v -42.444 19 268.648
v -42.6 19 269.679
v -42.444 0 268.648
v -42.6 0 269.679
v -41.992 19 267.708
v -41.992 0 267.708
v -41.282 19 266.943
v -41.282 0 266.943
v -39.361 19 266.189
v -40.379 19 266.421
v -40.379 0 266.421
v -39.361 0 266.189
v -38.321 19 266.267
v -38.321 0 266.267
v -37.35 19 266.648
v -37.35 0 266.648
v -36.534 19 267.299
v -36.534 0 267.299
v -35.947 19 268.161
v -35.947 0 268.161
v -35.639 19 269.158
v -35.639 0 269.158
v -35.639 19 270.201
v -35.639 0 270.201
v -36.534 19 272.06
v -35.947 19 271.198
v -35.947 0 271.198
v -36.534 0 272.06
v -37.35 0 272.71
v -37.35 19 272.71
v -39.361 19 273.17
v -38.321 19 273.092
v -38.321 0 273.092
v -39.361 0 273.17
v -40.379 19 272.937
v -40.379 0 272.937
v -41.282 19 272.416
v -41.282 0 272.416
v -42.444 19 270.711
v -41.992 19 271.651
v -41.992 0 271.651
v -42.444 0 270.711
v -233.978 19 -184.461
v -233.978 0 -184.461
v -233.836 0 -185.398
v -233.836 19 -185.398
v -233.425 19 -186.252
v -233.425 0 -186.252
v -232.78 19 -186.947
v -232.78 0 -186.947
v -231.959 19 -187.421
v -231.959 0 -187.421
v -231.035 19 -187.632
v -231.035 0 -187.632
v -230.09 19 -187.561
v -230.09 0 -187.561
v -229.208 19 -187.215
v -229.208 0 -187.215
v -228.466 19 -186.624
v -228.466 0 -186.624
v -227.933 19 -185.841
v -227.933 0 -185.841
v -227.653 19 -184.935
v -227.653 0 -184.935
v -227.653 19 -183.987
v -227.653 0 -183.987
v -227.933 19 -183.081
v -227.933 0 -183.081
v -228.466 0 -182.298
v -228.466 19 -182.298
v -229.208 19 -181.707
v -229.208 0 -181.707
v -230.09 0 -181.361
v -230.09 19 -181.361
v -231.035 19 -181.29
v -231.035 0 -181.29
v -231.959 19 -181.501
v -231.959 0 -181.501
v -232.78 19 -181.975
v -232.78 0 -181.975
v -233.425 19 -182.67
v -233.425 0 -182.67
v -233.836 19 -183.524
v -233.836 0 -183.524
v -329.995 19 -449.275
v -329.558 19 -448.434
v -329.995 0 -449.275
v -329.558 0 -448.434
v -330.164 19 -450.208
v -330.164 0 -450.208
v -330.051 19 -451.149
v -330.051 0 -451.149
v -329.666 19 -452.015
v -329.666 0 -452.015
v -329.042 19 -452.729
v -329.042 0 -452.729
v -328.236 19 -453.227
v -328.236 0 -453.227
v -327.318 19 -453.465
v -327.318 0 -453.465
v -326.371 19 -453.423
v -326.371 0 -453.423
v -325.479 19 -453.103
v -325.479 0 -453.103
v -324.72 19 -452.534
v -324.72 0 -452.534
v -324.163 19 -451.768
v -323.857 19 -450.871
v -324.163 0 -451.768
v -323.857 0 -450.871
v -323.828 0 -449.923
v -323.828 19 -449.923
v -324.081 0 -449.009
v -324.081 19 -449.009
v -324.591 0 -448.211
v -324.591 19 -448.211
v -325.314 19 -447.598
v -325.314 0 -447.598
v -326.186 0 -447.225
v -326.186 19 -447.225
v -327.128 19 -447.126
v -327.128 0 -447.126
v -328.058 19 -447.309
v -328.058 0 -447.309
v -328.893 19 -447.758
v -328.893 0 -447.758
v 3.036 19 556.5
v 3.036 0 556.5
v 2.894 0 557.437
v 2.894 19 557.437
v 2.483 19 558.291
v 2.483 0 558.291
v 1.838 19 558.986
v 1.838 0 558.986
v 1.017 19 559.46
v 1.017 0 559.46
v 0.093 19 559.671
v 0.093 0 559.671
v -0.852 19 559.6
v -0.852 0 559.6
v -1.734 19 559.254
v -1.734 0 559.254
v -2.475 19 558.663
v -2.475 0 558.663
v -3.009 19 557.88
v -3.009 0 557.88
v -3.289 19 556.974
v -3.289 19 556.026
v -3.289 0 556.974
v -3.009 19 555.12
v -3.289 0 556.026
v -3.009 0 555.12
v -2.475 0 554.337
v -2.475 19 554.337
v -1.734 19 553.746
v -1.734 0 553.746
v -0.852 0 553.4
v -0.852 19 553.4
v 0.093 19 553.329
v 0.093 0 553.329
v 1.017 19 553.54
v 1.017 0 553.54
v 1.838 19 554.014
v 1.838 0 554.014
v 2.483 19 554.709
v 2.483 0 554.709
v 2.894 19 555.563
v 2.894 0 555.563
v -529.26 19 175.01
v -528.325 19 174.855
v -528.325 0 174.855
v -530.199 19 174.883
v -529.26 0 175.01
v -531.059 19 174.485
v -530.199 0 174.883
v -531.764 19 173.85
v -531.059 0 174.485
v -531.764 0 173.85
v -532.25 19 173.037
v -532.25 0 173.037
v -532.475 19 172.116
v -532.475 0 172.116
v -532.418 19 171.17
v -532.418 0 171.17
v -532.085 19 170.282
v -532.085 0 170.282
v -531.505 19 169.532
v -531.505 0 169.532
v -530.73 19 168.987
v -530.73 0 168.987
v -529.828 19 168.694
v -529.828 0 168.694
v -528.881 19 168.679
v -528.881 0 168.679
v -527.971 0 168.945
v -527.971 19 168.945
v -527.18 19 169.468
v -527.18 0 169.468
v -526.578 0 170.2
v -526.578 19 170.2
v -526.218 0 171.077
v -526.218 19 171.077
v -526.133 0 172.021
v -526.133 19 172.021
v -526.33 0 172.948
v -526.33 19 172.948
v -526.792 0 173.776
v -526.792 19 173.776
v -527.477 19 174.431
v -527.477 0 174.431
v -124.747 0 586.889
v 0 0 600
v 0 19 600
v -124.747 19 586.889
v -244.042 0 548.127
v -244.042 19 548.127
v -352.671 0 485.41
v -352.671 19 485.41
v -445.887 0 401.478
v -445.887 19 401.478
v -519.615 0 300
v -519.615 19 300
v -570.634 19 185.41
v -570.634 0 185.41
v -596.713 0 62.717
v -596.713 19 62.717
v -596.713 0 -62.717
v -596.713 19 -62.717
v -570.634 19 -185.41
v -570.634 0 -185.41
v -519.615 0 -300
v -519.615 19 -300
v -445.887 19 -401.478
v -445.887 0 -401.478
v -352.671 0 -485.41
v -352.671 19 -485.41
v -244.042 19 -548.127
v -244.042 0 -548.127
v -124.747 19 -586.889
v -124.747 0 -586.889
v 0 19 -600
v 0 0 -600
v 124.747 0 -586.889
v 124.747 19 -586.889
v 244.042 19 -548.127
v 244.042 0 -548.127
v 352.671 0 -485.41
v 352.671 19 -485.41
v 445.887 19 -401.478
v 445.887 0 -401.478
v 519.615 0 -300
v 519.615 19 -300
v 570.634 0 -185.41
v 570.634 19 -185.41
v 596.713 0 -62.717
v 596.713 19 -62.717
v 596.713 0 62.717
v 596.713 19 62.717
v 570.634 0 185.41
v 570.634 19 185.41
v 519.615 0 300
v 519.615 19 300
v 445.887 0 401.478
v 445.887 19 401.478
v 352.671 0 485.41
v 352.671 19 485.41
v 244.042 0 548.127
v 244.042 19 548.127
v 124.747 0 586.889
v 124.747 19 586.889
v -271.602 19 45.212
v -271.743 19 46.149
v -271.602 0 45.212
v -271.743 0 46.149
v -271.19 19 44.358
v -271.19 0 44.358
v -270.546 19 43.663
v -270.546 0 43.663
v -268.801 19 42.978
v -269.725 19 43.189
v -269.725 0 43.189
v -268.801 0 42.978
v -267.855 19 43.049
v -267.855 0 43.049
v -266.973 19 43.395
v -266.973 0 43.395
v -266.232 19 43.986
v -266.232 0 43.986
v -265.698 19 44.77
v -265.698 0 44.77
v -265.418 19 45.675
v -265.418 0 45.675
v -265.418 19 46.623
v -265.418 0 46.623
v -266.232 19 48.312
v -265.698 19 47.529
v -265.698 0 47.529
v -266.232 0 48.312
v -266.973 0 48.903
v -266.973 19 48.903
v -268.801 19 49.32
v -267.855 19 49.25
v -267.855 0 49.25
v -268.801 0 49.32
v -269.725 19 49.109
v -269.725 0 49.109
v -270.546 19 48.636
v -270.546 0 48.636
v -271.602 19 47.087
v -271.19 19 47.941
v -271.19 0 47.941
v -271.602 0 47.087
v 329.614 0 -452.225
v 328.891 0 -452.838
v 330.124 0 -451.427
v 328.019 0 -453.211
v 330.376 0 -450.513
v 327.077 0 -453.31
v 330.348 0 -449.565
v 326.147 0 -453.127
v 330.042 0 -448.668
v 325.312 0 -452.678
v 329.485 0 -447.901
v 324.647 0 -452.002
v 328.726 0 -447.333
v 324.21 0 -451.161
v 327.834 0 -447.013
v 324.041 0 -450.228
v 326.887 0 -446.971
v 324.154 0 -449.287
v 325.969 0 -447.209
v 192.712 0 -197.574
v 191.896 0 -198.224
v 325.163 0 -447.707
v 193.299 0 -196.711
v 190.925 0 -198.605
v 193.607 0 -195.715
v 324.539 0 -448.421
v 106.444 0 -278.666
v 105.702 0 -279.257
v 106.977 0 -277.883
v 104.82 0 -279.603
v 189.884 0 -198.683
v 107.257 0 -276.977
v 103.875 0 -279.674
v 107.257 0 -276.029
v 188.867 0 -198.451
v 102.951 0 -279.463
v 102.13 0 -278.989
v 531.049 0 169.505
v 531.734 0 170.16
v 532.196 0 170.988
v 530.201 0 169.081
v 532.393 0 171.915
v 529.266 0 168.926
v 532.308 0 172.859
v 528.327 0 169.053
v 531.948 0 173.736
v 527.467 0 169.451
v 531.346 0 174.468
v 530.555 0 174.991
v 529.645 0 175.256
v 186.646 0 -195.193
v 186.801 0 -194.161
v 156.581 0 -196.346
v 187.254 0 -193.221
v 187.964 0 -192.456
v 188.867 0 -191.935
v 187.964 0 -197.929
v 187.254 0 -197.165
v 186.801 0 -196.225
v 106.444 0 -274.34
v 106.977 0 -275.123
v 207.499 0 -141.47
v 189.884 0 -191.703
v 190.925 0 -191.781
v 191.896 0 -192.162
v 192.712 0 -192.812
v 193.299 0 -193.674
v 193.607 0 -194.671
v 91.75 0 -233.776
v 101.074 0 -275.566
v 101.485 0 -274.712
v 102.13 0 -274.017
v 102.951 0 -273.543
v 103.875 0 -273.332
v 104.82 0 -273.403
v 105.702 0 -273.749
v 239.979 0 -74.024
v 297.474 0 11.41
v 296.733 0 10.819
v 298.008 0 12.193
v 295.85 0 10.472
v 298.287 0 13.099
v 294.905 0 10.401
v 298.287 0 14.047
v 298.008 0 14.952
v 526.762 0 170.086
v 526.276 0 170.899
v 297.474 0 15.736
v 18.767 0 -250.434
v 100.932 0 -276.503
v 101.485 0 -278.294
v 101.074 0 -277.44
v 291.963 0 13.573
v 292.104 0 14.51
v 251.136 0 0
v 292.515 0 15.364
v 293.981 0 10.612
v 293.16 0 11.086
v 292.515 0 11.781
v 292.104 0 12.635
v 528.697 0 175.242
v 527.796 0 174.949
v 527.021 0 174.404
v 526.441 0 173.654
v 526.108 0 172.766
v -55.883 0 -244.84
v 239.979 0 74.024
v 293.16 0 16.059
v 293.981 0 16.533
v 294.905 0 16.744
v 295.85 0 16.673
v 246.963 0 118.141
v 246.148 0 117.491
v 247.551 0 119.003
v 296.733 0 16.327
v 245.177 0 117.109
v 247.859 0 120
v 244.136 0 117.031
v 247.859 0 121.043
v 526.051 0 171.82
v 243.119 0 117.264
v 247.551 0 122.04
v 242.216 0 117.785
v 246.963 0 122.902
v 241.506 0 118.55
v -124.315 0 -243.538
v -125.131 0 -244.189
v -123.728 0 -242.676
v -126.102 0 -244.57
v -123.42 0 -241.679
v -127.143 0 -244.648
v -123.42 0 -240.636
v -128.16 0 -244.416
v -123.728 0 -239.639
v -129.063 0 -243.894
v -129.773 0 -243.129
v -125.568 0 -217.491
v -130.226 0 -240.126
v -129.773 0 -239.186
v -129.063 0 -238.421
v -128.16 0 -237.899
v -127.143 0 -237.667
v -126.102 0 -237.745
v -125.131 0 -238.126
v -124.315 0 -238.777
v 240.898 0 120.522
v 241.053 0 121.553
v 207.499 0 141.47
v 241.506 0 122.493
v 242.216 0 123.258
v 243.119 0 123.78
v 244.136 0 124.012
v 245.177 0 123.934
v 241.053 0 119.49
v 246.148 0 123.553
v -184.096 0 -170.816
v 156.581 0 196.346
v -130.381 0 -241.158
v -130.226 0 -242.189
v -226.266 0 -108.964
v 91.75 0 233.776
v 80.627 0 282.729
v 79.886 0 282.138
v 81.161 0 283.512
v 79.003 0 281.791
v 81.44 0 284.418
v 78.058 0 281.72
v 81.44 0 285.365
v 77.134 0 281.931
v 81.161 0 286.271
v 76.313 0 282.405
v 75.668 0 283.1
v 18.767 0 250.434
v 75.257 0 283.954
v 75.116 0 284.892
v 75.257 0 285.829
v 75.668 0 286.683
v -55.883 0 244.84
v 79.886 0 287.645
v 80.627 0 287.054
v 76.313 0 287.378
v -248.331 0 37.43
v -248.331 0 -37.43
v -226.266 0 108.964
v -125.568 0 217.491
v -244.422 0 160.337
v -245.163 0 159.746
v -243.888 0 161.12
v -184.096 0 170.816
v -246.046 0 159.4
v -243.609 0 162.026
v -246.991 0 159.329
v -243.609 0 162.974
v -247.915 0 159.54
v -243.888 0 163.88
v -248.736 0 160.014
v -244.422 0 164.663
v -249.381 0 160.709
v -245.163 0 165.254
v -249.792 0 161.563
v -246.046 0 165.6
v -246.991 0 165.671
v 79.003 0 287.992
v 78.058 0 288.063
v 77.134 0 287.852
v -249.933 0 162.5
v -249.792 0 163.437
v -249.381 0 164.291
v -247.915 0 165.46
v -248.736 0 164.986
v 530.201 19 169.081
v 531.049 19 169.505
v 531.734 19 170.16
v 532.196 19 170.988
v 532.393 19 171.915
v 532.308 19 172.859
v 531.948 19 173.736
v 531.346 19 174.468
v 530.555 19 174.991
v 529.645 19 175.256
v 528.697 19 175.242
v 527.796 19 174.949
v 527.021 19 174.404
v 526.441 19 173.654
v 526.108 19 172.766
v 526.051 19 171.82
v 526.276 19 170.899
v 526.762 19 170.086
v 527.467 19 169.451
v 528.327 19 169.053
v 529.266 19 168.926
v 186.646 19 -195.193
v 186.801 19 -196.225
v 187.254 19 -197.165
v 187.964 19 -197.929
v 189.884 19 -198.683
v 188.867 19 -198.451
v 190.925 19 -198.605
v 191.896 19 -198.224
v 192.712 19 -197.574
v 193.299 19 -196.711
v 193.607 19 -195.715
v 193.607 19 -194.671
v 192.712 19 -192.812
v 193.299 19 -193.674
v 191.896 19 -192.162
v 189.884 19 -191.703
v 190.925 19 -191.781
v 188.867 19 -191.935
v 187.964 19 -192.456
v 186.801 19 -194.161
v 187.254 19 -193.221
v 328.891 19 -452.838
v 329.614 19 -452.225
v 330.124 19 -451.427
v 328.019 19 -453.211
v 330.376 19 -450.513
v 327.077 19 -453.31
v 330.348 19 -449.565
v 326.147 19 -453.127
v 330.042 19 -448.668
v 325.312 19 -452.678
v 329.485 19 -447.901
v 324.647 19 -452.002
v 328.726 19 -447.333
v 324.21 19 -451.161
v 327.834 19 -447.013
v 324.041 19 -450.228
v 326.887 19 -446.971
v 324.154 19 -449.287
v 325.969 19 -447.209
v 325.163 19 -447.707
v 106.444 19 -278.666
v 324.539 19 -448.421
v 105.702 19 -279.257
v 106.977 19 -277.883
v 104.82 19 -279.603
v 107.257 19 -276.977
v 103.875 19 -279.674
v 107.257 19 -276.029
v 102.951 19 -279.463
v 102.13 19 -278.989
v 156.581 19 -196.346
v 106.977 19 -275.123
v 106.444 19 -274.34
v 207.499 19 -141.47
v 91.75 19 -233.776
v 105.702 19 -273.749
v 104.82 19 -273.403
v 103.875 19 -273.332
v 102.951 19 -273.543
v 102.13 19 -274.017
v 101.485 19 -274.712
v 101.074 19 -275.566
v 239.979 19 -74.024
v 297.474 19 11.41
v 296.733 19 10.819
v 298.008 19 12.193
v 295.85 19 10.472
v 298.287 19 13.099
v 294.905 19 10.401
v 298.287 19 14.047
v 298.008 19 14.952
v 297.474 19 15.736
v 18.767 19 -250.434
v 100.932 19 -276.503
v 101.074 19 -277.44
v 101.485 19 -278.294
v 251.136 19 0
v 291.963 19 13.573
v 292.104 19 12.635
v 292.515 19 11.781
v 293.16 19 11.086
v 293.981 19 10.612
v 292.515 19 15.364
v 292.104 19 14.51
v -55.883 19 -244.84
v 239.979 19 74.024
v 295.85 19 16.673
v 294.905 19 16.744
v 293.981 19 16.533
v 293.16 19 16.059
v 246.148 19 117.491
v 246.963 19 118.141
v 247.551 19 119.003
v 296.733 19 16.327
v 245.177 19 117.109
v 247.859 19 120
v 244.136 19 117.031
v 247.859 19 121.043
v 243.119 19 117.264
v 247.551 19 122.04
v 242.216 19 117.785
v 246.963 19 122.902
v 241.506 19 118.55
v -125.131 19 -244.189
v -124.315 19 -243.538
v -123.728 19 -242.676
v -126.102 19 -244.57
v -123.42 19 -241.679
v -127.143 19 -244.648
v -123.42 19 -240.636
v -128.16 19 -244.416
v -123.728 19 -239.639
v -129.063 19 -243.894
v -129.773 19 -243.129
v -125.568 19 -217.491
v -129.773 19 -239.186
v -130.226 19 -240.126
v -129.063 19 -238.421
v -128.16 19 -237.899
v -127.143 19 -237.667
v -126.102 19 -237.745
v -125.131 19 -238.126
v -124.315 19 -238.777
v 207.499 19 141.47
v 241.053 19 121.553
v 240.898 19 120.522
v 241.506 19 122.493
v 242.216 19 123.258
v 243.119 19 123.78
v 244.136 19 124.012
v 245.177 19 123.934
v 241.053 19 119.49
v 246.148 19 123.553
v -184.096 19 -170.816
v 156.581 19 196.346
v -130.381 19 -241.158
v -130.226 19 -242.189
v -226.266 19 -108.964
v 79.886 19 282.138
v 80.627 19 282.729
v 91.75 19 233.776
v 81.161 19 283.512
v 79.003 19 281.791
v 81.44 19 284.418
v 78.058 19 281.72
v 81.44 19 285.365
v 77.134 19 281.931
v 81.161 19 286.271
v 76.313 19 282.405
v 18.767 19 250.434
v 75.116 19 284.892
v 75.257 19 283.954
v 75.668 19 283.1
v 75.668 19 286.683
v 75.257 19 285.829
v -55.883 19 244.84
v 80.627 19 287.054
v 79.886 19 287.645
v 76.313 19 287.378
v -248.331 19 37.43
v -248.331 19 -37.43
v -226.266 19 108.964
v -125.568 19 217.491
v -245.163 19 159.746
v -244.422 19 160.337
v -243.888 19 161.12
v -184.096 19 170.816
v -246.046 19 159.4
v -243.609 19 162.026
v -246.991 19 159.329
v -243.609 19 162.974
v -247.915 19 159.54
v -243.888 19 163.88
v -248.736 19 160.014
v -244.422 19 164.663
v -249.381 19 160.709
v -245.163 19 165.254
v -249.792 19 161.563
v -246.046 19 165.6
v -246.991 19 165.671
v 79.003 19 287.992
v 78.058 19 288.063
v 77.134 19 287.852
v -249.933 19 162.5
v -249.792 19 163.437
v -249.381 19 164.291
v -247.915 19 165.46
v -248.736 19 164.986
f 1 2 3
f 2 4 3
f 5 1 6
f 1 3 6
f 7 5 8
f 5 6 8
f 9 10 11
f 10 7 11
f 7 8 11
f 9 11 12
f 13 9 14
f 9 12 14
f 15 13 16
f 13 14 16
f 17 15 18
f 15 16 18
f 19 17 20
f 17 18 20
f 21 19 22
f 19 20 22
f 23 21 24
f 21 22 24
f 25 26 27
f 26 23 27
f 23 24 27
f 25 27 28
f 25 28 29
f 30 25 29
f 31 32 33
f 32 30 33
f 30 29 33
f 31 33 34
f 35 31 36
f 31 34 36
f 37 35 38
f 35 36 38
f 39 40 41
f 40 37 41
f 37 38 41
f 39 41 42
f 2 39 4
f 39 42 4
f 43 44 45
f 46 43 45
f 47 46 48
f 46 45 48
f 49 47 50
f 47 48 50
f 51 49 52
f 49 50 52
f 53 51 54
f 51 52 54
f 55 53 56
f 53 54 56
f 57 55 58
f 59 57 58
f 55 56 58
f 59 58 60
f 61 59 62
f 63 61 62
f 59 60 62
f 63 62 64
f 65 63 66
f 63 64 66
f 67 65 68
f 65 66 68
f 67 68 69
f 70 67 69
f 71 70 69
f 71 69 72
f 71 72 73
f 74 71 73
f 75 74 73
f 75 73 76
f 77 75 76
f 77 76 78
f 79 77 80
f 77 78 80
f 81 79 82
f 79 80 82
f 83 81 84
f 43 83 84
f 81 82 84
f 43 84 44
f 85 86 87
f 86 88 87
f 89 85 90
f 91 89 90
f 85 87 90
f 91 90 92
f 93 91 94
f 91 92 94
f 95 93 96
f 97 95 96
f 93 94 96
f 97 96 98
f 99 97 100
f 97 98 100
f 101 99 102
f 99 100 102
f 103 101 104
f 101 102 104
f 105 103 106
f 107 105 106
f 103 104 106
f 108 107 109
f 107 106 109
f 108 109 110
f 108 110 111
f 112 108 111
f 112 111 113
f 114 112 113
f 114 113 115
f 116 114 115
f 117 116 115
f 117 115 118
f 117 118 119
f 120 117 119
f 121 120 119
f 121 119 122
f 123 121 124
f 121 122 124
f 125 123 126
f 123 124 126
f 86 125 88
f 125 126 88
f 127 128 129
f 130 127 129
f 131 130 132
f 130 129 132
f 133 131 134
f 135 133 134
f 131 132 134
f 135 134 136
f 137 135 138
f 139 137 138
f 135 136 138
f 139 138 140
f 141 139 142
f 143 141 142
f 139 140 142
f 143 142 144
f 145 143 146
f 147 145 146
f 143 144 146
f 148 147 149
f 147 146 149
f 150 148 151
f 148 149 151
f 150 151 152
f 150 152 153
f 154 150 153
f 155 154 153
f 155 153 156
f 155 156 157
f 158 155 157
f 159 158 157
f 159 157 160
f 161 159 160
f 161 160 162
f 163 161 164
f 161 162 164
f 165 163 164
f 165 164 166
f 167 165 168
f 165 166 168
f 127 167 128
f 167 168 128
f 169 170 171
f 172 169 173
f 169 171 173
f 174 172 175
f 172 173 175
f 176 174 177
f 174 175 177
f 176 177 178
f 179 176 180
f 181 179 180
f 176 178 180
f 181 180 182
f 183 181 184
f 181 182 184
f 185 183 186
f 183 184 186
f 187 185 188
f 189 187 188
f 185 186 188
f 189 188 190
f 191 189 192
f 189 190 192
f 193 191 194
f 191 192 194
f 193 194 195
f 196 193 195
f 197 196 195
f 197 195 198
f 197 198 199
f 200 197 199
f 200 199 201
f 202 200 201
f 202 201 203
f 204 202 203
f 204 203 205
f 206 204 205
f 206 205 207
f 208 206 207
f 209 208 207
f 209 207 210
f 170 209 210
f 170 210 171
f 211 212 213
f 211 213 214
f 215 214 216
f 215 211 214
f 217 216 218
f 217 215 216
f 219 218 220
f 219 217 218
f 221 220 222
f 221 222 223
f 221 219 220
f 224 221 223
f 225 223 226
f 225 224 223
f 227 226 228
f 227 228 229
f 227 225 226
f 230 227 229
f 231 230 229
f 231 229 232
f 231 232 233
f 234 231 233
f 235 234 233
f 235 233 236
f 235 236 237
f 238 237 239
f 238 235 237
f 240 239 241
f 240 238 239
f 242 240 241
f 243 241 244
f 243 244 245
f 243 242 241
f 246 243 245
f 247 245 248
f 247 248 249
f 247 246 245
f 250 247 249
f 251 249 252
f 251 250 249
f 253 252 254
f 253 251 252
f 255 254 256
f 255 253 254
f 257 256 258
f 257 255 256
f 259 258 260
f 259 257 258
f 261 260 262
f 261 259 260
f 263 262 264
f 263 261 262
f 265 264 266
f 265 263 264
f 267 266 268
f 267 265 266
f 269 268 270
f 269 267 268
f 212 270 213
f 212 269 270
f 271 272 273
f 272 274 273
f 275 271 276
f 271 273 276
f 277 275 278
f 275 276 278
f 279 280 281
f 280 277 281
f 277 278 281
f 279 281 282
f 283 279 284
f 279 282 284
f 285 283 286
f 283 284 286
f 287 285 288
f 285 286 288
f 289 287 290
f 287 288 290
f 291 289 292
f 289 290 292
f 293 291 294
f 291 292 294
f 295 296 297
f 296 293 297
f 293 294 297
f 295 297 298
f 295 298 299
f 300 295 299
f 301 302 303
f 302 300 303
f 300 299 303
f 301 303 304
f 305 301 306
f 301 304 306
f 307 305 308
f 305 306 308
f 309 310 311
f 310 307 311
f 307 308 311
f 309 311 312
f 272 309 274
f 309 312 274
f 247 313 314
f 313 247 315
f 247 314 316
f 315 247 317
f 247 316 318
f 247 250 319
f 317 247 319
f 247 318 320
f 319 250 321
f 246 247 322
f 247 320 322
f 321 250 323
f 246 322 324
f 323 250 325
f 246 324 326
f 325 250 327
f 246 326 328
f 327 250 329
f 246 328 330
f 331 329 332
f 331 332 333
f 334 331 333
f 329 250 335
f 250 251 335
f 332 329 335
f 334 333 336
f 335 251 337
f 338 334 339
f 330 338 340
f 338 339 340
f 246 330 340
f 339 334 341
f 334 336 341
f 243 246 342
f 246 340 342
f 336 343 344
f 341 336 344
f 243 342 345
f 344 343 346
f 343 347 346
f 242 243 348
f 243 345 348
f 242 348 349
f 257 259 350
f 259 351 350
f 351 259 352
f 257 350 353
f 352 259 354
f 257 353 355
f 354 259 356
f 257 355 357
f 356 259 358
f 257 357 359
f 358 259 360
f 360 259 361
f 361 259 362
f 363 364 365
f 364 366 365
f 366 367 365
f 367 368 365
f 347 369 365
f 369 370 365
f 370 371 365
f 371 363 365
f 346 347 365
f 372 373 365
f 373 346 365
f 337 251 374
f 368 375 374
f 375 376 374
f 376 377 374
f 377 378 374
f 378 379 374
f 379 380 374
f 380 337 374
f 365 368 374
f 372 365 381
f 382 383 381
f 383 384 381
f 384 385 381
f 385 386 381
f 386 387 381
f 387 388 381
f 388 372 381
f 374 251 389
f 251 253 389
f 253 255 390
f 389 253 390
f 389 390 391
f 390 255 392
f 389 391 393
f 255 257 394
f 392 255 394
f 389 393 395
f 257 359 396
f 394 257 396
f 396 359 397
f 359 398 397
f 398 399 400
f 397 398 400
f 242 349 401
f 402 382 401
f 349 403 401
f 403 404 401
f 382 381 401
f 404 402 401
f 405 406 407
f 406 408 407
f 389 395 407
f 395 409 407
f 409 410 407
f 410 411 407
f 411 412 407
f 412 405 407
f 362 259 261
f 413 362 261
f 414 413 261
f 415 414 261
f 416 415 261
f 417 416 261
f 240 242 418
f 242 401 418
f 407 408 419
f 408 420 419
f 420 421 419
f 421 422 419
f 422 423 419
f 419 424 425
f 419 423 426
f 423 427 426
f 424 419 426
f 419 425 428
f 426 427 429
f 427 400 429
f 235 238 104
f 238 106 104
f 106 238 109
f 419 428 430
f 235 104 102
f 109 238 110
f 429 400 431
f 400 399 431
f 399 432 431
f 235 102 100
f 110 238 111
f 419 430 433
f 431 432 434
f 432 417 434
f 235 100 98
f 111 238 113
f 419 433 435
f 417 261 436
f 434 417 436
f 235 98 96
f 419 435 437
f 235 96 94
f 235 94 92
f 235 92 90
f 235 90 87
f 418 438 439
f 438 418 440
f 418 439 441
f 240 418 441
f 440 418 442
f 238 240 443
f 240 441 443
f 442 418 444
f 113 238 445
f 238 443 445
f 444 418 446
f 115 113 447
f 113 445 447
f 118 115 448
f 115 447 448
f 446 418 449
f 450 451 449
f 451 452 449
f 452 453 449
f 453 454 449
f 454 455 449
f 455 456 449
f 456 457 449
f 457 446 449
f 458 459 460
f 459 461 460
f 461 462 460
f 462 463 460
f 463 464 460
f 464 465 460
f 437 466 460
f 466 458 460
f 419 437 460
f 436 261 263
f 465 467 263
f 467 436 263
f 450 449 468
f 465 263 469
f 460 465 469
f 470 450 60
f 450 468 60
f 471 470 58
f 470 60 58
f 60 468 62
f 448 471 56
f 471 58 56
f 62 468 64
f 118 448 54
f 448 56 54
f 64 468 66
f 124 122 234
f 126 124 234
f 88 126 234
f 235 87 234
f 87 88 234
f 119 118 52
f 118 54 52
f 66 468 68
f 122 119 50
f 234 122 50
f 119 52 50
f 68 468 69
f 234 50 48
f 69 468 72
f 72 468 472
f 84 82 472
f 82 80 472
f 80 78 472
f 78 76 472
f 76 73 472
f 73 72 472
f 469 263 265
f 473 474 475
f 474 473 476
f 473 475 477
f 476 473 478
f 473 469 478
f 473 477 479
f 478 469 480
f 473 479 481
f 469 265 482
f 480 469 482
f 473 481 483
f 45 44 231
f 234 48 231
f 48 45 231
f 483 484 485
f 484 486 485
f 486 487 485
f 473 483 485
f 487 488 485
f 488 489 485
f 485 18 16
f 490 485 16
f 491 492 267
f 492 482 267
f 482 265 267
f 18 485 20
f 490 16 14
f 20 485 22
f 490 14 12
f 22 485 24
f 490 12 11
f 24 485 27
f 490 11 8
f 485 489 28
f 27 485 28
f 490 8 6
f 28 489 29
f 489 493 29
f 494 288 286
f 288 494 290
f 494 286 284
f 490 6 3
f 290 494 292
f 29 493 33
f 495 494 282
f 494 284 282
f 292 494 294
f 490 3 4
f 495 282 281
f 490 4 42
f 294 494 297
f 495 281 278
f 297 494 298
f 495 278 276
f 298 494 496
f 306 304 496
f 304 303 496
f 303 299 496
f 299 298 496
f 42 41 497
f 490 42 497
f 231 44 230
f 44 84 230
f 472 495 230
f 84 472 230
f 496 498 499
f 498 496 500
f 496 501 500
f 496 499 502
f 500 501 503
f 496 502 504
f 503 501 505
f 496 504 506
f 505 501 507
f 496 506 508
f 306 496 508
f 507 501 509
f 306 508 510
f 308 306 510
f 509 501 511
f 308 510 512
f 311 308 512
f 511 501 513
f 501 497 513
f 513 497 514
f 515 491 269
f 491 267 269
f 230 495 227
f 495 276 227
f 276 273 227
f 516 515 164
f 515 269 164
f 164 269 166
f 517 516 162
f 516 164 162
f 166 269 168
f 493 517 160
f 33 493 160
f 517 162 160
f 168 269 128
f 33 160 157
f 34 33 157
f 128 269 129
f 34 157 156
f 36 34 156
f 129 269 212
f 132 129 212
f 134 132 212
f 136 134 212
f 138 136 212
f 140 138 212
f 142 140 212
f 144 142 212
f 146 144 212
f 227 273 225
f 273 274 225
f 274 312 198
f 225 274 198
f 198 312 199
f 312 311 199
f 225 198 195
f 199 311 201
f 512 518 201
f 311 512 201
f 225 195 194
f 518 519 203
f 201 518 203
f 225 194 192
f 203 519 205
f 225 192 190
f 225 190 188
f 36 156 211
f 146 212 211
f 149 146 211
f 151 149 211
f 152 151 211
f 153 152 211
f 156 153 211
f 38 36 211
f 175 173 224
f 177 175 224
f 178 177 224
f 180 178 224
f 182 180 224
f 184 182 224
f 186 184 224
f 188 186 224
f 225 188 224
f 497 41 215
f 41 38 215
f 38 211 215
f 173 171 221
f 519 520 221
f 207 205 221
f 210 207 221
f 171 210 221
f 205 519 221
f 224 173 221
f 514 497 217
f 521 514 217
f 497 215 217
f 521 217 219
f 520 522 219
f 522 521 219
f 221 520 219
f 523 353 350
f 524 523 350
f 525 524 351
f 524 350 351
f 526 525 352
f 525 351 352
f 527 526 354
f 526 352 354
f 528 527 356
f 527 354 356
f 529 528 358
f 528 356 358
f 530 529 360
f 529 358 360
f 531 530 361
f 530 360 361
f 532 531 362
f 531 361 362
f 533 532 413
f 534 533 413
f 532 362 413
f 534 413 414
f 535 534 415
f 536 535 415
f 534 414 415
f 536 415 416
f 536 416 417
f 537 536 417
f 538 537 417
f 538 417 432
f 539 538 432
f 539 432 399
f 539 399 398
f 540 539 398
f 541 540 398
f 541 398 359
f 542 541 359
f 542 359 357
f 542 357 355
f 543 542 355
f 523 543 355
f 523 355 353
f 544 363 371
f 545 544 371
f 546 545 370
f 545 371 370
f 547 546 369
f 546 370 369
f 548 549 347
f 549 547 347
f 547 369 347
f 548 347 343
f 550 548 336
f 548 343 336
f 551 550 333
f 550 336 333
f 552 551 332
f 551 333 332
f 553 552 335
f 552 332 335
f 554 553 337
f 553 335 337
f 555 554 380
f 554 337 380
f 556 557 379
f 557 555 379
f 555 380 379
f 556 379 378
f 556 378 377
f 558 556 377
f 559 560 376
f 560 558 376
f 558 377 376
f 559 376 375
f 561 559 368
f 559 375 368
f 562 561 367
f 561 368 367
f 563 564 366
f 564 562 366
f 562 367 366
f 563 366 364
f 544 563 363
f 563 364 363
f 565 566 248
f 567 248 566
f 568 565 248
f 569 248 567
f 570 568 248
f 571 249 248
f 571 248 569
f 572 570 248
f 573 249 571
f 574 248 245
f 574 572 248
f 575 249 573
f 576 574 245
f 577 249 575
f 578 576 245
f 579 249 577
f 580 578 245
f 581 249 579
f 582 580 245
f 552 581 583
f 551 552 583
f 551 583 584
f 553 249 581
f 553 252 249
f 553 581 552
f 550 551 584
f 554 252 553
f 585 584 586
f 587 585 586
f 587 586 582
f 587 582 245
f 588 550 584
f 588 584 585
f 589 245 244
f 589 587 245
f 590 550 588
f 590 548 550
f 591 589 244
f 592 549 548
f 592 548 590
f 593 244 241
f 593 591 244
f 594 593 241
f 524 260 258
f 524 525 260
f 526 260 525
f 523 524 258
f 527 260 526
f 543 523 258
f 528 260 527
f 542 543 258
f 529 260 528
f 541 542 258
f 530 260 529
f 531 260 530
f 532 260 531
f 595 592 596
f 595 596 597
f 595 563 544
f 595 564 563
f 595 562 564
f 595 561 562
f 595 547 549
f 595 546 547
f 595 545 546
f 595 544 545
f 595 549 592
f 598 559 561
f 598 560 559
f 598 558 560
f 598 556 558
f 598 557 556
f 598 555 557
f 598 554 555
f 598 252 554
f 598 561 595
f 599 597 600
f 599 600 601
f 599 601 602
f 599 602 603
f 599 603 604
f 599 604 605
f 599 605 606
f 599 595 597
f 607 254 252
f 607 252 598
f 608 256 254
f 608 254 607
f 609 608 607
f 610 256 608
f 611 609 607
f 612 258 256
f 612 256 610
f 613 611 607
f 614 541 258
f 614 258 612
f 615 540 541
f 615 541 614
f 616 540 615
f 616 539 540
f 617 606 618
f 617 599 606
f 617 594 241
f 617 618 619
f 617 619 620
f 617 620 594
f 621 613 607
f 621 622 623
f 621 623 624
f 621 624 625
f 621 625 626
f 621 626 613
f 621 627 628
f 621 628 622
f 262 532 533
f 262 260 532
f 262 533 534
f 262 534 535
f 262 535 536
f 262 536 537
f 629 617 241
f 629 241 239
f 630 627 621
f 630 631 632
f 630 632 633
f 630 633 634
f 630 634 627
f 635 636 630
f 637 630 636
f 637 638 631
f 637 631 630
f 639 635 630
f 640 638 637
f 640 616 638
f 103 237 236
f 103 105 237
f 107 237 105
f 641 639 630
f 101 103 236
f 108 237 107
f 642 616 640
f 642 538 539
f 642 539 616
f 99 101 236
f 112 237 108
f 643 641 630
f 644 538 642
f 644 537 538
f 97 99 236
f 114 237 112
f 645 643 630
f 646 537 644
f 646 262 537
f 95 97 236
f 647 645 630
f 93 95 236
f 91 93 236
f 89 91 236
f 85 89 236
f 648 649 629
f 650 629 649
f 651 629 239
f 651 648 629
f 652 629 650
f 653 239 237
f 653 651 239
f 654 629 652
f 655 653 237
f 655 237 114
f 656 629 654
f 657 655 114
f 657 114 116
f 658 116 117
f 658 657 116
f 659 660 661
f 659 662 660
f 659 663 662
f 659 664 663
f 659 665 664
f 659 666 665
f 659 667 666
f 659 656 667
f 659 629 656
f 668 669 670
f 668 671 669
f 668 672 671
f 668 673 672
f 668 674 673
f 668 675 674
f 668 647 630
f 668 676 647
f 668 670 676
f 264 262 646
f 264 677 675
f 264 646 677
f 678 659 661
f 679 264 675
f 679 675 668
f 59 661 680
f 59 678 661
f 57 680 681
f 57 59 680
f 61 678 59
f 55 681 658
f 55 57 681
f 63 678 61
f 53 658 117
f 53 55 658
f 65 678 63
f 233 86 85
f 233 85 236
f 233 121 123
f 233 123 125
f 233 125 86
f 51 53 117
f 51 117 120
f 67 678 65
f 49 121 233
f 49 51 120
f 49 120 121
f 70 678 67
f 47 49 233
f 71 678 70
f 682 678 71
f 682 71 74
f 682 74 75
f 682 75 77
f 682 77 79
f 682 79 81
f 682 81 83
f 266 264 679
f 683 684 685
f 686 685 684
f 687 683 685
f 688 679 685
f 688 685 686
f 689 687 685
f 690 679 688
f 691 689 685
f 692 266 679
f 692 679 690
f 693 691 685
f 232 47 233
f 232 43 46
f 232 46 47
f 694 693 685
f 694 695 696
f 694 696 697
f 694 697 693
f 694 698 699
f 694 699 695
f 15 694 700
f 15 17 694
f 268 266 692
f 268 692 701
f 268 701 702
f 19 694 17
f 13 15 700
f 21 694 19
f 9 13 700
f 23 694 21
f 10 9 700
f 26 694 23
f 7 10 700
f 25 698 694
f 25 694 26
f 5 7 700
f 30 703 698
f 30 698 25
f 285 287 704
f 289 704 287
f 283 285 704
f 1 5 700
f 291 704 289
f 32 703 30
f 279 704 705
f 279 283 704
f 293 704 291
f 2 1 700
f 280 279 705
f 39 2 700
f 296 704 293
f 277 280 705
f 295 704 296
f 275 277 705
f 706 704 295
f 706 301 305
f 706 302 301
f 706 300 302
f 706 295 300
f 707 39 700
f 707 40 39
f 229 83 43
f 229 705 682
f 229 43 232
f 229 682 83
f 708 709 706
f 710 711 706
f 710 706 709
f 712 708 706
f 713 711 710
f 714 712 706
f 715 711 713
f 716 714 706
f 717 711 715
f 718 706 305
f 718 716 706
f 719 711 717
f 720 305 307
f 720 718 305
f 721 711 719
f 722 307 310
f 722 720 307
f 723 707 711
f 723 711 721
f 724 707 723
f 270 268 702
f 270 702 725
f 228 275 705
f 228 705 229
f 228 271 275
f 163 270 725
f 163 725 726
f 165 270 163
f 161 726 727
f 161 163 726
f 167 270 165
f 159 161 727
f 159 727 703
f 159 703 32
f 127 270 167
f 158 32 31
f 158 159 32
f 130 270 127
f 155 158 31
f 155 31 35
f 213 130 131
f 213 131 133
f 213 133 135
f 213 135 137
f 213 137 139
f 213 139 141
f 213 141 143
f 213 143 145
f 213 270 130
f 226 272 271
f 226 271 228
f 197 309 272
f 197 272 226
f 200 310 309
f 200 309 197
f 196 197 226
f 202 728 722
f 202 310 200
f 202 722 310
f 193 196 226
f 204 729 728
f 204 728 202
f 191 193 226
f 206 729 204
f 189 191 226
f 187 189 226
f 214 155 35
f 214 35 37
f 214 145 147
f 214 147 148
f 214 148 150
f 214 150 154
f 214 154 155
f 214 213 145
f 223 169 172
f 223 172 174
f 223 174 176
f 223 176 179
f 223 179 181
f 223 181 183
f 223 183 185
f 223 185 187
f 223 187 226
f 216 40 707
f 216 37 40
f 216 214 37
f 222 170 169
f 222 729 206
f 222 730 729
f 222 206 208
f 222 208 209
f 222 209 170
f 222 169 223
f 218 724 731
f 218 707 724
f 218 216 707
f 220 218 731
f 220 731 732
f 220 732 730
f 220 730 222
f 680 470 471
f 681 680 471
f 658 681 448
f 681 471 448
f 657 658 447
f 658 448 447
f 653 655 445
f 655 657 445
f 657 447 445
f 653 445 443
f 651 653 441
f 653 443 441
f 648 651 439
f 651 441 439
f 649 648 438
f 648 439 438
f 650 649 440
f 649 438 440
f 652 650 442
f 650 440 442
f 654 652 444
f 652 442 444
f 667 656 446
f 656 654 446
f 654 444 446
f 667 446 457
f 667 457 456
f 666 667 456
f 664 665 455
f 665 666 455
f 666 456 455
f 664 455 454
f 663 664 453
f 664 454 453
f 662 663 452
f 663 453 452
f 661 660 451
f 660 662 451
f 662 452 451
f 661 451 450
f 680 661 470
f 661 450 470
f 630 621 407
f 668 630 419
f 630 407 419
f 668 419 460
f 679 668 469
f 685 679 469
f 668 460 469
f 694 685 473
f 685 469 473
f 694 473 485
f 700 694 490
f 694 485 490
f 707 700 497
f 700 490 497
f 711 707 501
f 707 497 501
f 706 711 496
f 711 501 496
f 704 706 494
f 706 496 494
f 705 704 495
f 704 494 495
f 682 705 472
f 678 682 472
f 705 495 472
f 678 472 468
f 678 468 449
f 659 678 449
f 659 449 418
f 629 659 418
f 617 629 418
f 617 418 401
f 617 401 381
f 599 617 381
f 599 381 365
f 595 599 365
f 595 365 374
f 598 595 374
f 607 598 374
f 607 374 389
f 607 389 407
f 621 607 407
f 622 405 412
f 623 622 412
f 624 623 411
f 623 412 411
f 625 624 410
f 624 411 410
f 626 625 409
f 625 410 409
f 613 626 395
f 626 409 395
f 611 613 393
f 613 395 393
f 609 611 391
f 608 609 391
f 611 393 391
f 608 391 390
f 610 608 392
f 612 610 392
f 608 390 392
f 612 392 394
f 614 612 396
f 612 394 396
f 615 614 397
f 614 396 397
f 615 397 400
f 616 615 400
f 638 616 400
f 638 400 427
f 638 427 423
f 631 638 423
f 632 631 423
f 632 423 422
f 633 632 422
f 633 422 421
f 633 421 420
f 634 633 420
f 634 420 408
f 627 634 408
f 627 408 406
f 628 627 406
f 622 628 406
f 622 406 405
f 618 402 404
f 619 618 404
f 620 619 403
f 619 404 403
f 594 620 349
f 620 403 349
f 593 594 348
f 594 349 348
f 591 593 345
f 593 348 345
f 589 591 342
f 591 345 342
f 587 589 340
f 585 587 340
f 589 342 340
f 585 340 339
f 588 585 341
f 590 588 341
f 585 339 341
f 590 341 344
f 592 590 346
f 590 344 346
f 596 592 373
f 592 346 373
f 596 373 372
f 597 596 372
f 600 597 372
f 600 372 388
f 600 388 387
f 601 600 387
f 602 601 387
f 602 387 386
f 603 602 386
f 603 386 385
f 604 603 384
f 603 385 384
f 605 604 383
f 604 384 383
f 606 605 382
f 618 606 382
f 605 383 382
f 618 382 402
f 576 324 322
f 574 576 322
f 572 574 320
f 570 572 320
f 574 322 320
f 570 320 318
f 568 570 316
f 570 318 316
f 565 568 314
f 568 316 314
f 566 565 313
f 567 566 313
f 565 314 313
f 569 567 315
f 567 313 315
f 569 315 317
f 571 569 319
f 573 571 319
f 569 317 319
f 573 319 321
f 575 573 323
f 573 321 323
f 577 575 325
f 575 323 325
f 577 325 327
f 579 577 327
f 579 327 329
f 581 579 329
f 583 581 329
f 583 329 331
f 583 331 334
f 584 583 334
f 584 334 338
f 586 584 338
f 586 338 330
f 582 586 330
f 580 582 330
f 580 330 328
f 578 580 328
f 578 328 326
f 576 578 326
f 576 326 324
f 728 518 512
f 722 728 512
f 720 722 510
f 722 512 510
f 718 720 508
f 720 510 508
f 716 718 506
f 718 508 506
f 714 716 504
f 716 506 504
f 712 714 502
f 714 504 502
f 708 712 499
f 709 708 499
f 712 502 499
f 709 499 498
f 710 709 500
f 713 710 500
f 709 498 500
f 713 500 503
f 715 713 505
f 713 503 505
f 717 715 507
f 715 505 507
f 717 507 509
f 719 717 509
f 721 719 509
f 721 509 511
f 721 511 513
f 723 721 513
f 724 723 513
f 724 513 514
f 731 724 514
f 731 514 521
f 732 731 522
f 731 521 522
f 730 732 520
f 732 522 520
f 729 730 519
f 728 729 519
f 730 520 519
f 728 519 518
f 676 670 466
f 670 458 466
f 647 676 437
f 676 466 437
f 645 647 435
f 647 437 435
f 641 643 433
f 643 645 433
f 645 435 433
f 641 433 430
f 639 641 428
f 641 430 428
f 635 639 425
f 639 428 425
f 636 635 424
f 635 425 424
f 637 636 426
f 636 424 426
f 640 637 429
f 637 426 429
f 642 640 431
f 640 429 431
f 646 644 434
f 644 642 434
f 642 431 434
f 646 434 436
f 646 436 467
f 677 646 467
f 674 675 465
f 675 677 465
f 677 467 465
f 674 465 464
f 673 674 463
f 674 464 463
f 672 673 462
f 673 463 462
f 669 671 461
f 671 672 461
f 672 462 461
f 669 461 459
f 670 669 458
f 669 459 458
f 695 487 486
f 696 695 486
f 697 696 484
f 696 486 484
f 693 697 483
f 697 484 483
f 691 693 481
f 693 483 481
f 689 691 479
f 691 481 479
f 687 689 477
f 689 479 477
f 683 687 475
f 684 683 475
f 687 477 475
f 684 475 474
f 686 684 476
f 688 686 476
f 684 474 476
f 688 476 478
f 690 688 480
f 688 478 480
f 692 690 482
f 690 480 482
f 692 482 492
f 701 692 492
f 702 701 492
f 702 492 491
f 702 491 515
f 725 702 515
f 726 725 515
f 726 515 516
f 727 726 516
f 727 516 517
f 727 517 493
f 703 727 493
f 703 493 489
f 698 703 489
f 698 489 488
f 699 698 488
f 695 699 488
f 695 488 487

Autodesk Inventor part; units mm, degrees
ref_plane "YZ Plane" through (0, 0, 0) normal (1, 0, 0) x (0, 1, 0)
ref_plane "XZ Plane" through (0, 0, 0) normal (0, 1, 0) x (-1, 0, 0)
ref_plane "XY Plane" through (0, 0, 0) normal (0, 0, 1) x (1, 0, 0)
sketch "Sketch1" plane through (0, 0, 0) normal (0, 1, 0) x (-1, 0, 0)
  line L0 (1200, -600) -> (-1200, -600)
  line L1 (-1200, -600) -> (-1200, 600)
  line L2 (-1200, 600) -> (1200, 600)
  line L3 (1200, 600) -> (1200, -600)
  line L4 (1200, -600) -> (-1200, 600) construction
  line L5 (-1200, -600) -> (1200, 600) construction
  circle A0 centre (0, 0) radius 130 construction
  circle A1 centre (0, 0) radius 325 construction
  line L6 (0, 325) -> (309.0934, 100.4305) construction
  line L7 (309.0934, 100.4305) -> (191.0302, -262.9305) construction
  line L8 (191.0302, -262.9305) -> (-191.0302, -262.9305) construction
  line L9 (-191.0302, -262.9305) -> (-309.0934, 100.4305) construction
  line L10 (-309.0934, 100.4305) -> (0, 325) construction
  line L11 (0, 0) -> (0, 325) construction
  line L12 (0, 0) -> (-309.0934, 100.4305) construction
  line L13 (0, 0) -> (-191.0302, -262.9305) construction
  line L14 (0, 0) -> (309.0934, 100.4305) construction
  line L15 (0, 0) -> (191.0302, -262.9305) construction
  arc A2 (-15.7737, 293.9464) -> (0, 0) centre (281.4583, 162.5) ccw
  arc A3 (224.7845, 110.9324) -> (0, 0) centre (230.7976, -184.461) ccw
  arc A4 (275.3692, 201.188) -> (35.5667, 329.5753) centre (50.8772, 70.0265) ccw
  arc A5 (224.7845, 110.9324) -> (275.3692, 201.188) centre (223.5633, 170.92) ccw
  arc A6 (35.5667, 329.5753) -> (-15.7737, 293.9464) centre (39.0999, 269.6794) ccw
  arc A7 (-284.434, 75.8328) -> (0, 0) centre (-67.5713, 317.898) ccw
  arc A8 (-36.0407, 248.0627) -> (0, 0) centre (246.7532, 162.5) ccw
  arc A9 (-106.2474, 324.0622) -> (-302.454, 135.6703) centre (-50.8772, 70.0265) ccw
  arc A10 (-36.0407, 248.0627) -> (-106.2474, 324.0622) centre (-93.4697, 265.4385) ccw
  arc A11 (-302.454, 135.6703) -> (-284.434, 75.8328) centre (-244.3978, 120.5217) ccw
  arc A12 (-160.0162, -247.0792) -> (0, 0) centre (-323.2196, 33.9718) ccw
  arc A13 (-247.0589, 42.3788) -> (0, 0) centre (-78.2958, 284.8915) ccw
  arc A14 (-341.0337, -0.9066) -> (-222.4935, -245.7264) centre (-82.321, -26.7477) ccw
  arc A15 (-247.0589, 42.3788) -> (-341.0337, -0.9066) centre (-281.3308, -6.8699) ccw
  arc A16 (-222.4935, -245.7264) -> (-160.0162, -247.0792) centre (-190.146, -195.1929) ccw
  arc A17 (185.5386, -228.5361) -> (0, 0) centre (-132.1894, -296.9023) ccw
  arc A18 (-116.65, -221.8712) -> (0, 0) centre (-295.1426, 13.5726) ccw
  arc A19 (-104.523, -324.6224) -> (164.9454, -287.5376) centre (0, -86.5575) ccw
  arc A20 (-116.65, -221.8712) -> (-104.523, -324.6224) centre (-80.4023, -269.6844) ccw
  arc A21 (164.9454, -287.5376) -> (185.5386, -228.5361) centre (126.8811, -241.1575) ccw
  arc A22 (274.6853, 105.8361) -> (0, 0) centre (241.5221, -217.4674) ccw
  arc A23 (174.9652, -179.5027) -> (0, 0) centre (-104.1124, -276.5031) ccw
  arc A24 (276.4349, -199.7211) -> (324.4354, 68.0184) centre (82.321, -26.7477) ccw
  arc A25 (174.9652, -179.5027) -> (276.4349, -199.7211) centre (231.6394, -159.8042) ccw
  arc A26 (324.4354, 68.0184) -> (274.6853, 105.8361) centre (268.5629, 46.1493) ccw
  line L16 (246.7532, 162.5) -> (-78.2958, 284.8915)
  line L17 (-78.2958, 284.8915) -> (-295.1426, 13.5726)
  line L18 (-295.1426, 13.5726) -> (-104.1124, -276.5031)
  line L19 (-104.1124, -276.5031) -> (230.7976, -184.461)
  line L20 (230.7976, -184.461) -> (246.7532, 162.5)
  circle A27 centre (0, 0) radius 251.1364
  circle A28 centre (223.5633, 170.92) radius 60 construction
  circle A29 centre (246.7532, 162.5) radius 43.2425 construction
  circle A30 centre (246.7532, 162.5) radius 3.18
  circle A31 centre (39.0999, 269.6794) radius 3.5
  circle A32 centre (-78.2958, 284.8915) radius 3.18
  circle A33 centre (-244.3978, 120.5217) radius 3.5
  circle A34 centre (-295.1426, 13.5726) radius 3.18
  circle A35 centre (-190.146, -195.1929) radius 3.5
  circle A36 centre (-104.1124, -276.5031) radius 3.18
  circle A37 centre (126.8811, -241.1575) radius 3.5
  circle A38 centre (230.7976, -184.461) radius 3.18
  circle A39 centre (268.5629, 46.1493) radius 3.18
  point P0 (-309.0934, 100.4305)
  point P1 (0, 325)
  point P2 (-191.0302, -262.9305)
  point P3 (-309.0934, 100.4305)
  point P4 (191.0302, -262.9305)
  point P5 (-191.0302, -262.9305)
  point P6 (309.0934, 100.4305)
  point P7 (191.0302, -262.9305)
  dimension "d3" = 650
  dimension "d0" = 2400
  dimension "d1" = 1200
  dimension "d2" = 260
  dimension "d9" = 325
  dimension "d10" = 295.4545
  dimension "d11" = 260
  dimension "d12" = 60
  dimension "d15" = 360
  dimension "d21" = 502.2727
  dimension "d22" = 6.36
  dimension "d23" = 7
  dimension "d24" = 6.36
  dimension "d25" = 7
  dimension "d26" = 6.36
  dimension "d27" = 7
  dimension "d28" = 6.36
  dimension "d29" = 7
  dimension "d30" = 6.36
  dimension "d31" = 6.36
extrude "Extrusion1" add sketch "Sketch1" along normal blind 19 contours L0 L1 L2 L3 | A6 A4 A5 L20 A30 L16 A27 A2 | L16 A27 A2 | A2 A27 A10 L16 | A27 L16 A5 A3 A2 | A2 A8 A10 A27 | A27 L16 | L16 A32 L17 A27 A7 A11 A9 A10 | A10 A27 L17 A32 L16 | A13 A15 A27 A7 | A7 A27 L17 A10 A8 | A18 A20 A27 A12 | A12 A27 L18 A15 A13 | A23 A25 A27 A17 | A17 A27 L19 A20 A18 | A3 A5 A27 A22 | A22 A27 L20 A25 A23 | L16 A30 L20 A5 A27 | A32 L17 L16 | L16 L17 A32 | L20 A22 A27 A5 | A27 A15 L17 A7 | A7 L17 A27 | A27 A20 L18 A12 | A12 L18 A27 | A27 A25 L19 A17 | A17 L19 A27 | A22 L20 A27 | L17 A27 | A30 L20 L16 | L16 L20 A30 | A22 A26 A24 A25 L19 A38 L20 A27 | A27 L18 A34 L17 A15 | A12 A16 A14 A15 L17 A34 L18 A27 | A27 L18 | A27 L19 A36 L18 A20 | A17 A21 A19 A20 L18 A36 L19 A27 | A27 L19 | A27 L20 A38 L19 A25 | A27 L20 | A34 L18 L17 | L17 L18 A34 | A36 L19 L18 | L18 L19 A36 | A38 L20 L19 | L19 L20 A38 | A31 | A33 | A35 | A37 | A39
extrude "Extrusion3" cut sketch "Sketch1" along normal blind 19 contours A32 L17 L16 | L16 L17 A32 | A30 L20 L16 | L16 L20 A30 | A34 L18 L17 | L17 L18 A34 | A36 L19 L18 | L18 L19 A36 | A38 L20 L19 | L19 L20 A38 | A31 | A33 | A35 | A37 | A39
sketch "Sketch3" plane through (0, 0, 0) normal (0, -1, 0) x (1, 0, 0)
  circle A0 centre (0, 0) radius 251.1364 projected
extrude "Extrusion4" cut sketch "Sketch3" against normal up to next
sketch "Sketch7" plane through (0, 0, 0) normal (0, -1, 0) x (1, 0, 0)
  arc A0 (-0.1434, 553) -> (-0.1452, 560) centre (-0.1443, 556.5) ccw projected
  circle A1 centre (-0.1443, 556.5) radius 3.18
  dimension "d50" = 6.36
extrude "Extrusion8" cut sketch "Sketch7" against normal blind 19
pattern_circular "Circular Pattern1" count 5 over 360 about axis through (0, 0, 0) along (0, 1, 0) of "Extrusion8"
sketch "Sketch8" plane through (0, 0, 0) normal (0, -1, 0) x (1, 0, 0)
  circle A0 centre (0, 0) radius 251.1364 projected
  line L0 (-1200, -600) -> (1200, -600) projected
  line L1 (1200, -600) -> (1200, 600) projected
  line L2 (1200, 600) -> (-1200, 600) projected
  line L3 (-1200, 600) -> (-1200, -600) projected
  circle A1 centre (0, 0) radius 600
  dimension "d47" = 1200
extrude "Extrusion9" cut sketch "Sketch8" against normal blind 19 contours A0 | L3 L2 A1 L0 | A1 L2 L1 L0
equation "\"d2\" = 0.4 * d3"
equation "\"d9\" = 0.5 * d3"
equation "\"d10\" = 0.454545 * d3"
equation "\"d11\" = 0.4 * d3"
equation "\"d21\" = 1.7 * d10"
equation "\"d24\" = d22"
equation "\"d26\" = d28"
equation "\"d28\" = d30"
equation "\"d30\" = d31"
equation "\"d31\" = d22"
properties part number "plancha"
